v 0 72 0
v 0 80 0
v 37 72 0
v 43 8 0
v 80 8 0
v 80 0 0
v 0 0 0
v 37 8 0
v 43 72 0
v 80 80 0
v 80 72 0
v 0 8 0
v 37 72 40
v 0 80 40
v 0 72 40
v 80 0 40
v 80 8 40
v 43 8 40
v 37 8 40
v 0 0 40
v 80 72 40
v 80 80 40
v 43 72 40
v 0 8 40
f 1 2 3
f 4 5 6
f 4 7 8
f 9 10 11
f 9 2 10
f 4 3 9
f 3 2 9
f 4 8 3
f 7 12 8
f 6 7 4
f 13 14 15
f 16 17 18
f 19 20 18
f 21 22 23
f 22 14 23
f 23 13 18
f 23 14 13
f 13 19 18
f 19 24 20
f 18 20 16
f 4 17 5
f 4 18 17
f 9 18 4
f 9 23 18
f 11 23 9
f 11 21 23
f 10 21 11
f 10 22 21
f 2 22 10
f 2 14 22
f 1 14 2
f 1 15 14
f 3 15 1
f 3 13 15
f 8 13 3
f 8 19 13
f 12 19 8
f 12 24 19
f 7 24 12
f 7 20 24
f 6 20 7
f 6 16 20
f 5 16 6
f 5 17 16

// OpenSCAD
$fn = 32;

// ----------------------------------------------------------------------
// Structural section: ibeam 80 x 80 mm
// ----------------------------------------------------------------------

// --- parameters (mm) ---
sec_w = 80;               // section width, X
sec_h = 80;               // section height, Y
flange_t = 8;             // flange thickness
web_t = 6;                // web thickness
plate_t = 40;             // cut length, Z (extrusion height)

profile = [[0, 0], [80, 0], [80, 8], [43, 8], [43, 72], [80, 72], [80, 80], [0, 80], [0, 72], [37, 72], [37, 8], [0, 8]];  // primary outline, 12 points, counter clockwise

// --- the one profile operation ---
linear_extrude(height = plate_t) polygon(points = profile);
